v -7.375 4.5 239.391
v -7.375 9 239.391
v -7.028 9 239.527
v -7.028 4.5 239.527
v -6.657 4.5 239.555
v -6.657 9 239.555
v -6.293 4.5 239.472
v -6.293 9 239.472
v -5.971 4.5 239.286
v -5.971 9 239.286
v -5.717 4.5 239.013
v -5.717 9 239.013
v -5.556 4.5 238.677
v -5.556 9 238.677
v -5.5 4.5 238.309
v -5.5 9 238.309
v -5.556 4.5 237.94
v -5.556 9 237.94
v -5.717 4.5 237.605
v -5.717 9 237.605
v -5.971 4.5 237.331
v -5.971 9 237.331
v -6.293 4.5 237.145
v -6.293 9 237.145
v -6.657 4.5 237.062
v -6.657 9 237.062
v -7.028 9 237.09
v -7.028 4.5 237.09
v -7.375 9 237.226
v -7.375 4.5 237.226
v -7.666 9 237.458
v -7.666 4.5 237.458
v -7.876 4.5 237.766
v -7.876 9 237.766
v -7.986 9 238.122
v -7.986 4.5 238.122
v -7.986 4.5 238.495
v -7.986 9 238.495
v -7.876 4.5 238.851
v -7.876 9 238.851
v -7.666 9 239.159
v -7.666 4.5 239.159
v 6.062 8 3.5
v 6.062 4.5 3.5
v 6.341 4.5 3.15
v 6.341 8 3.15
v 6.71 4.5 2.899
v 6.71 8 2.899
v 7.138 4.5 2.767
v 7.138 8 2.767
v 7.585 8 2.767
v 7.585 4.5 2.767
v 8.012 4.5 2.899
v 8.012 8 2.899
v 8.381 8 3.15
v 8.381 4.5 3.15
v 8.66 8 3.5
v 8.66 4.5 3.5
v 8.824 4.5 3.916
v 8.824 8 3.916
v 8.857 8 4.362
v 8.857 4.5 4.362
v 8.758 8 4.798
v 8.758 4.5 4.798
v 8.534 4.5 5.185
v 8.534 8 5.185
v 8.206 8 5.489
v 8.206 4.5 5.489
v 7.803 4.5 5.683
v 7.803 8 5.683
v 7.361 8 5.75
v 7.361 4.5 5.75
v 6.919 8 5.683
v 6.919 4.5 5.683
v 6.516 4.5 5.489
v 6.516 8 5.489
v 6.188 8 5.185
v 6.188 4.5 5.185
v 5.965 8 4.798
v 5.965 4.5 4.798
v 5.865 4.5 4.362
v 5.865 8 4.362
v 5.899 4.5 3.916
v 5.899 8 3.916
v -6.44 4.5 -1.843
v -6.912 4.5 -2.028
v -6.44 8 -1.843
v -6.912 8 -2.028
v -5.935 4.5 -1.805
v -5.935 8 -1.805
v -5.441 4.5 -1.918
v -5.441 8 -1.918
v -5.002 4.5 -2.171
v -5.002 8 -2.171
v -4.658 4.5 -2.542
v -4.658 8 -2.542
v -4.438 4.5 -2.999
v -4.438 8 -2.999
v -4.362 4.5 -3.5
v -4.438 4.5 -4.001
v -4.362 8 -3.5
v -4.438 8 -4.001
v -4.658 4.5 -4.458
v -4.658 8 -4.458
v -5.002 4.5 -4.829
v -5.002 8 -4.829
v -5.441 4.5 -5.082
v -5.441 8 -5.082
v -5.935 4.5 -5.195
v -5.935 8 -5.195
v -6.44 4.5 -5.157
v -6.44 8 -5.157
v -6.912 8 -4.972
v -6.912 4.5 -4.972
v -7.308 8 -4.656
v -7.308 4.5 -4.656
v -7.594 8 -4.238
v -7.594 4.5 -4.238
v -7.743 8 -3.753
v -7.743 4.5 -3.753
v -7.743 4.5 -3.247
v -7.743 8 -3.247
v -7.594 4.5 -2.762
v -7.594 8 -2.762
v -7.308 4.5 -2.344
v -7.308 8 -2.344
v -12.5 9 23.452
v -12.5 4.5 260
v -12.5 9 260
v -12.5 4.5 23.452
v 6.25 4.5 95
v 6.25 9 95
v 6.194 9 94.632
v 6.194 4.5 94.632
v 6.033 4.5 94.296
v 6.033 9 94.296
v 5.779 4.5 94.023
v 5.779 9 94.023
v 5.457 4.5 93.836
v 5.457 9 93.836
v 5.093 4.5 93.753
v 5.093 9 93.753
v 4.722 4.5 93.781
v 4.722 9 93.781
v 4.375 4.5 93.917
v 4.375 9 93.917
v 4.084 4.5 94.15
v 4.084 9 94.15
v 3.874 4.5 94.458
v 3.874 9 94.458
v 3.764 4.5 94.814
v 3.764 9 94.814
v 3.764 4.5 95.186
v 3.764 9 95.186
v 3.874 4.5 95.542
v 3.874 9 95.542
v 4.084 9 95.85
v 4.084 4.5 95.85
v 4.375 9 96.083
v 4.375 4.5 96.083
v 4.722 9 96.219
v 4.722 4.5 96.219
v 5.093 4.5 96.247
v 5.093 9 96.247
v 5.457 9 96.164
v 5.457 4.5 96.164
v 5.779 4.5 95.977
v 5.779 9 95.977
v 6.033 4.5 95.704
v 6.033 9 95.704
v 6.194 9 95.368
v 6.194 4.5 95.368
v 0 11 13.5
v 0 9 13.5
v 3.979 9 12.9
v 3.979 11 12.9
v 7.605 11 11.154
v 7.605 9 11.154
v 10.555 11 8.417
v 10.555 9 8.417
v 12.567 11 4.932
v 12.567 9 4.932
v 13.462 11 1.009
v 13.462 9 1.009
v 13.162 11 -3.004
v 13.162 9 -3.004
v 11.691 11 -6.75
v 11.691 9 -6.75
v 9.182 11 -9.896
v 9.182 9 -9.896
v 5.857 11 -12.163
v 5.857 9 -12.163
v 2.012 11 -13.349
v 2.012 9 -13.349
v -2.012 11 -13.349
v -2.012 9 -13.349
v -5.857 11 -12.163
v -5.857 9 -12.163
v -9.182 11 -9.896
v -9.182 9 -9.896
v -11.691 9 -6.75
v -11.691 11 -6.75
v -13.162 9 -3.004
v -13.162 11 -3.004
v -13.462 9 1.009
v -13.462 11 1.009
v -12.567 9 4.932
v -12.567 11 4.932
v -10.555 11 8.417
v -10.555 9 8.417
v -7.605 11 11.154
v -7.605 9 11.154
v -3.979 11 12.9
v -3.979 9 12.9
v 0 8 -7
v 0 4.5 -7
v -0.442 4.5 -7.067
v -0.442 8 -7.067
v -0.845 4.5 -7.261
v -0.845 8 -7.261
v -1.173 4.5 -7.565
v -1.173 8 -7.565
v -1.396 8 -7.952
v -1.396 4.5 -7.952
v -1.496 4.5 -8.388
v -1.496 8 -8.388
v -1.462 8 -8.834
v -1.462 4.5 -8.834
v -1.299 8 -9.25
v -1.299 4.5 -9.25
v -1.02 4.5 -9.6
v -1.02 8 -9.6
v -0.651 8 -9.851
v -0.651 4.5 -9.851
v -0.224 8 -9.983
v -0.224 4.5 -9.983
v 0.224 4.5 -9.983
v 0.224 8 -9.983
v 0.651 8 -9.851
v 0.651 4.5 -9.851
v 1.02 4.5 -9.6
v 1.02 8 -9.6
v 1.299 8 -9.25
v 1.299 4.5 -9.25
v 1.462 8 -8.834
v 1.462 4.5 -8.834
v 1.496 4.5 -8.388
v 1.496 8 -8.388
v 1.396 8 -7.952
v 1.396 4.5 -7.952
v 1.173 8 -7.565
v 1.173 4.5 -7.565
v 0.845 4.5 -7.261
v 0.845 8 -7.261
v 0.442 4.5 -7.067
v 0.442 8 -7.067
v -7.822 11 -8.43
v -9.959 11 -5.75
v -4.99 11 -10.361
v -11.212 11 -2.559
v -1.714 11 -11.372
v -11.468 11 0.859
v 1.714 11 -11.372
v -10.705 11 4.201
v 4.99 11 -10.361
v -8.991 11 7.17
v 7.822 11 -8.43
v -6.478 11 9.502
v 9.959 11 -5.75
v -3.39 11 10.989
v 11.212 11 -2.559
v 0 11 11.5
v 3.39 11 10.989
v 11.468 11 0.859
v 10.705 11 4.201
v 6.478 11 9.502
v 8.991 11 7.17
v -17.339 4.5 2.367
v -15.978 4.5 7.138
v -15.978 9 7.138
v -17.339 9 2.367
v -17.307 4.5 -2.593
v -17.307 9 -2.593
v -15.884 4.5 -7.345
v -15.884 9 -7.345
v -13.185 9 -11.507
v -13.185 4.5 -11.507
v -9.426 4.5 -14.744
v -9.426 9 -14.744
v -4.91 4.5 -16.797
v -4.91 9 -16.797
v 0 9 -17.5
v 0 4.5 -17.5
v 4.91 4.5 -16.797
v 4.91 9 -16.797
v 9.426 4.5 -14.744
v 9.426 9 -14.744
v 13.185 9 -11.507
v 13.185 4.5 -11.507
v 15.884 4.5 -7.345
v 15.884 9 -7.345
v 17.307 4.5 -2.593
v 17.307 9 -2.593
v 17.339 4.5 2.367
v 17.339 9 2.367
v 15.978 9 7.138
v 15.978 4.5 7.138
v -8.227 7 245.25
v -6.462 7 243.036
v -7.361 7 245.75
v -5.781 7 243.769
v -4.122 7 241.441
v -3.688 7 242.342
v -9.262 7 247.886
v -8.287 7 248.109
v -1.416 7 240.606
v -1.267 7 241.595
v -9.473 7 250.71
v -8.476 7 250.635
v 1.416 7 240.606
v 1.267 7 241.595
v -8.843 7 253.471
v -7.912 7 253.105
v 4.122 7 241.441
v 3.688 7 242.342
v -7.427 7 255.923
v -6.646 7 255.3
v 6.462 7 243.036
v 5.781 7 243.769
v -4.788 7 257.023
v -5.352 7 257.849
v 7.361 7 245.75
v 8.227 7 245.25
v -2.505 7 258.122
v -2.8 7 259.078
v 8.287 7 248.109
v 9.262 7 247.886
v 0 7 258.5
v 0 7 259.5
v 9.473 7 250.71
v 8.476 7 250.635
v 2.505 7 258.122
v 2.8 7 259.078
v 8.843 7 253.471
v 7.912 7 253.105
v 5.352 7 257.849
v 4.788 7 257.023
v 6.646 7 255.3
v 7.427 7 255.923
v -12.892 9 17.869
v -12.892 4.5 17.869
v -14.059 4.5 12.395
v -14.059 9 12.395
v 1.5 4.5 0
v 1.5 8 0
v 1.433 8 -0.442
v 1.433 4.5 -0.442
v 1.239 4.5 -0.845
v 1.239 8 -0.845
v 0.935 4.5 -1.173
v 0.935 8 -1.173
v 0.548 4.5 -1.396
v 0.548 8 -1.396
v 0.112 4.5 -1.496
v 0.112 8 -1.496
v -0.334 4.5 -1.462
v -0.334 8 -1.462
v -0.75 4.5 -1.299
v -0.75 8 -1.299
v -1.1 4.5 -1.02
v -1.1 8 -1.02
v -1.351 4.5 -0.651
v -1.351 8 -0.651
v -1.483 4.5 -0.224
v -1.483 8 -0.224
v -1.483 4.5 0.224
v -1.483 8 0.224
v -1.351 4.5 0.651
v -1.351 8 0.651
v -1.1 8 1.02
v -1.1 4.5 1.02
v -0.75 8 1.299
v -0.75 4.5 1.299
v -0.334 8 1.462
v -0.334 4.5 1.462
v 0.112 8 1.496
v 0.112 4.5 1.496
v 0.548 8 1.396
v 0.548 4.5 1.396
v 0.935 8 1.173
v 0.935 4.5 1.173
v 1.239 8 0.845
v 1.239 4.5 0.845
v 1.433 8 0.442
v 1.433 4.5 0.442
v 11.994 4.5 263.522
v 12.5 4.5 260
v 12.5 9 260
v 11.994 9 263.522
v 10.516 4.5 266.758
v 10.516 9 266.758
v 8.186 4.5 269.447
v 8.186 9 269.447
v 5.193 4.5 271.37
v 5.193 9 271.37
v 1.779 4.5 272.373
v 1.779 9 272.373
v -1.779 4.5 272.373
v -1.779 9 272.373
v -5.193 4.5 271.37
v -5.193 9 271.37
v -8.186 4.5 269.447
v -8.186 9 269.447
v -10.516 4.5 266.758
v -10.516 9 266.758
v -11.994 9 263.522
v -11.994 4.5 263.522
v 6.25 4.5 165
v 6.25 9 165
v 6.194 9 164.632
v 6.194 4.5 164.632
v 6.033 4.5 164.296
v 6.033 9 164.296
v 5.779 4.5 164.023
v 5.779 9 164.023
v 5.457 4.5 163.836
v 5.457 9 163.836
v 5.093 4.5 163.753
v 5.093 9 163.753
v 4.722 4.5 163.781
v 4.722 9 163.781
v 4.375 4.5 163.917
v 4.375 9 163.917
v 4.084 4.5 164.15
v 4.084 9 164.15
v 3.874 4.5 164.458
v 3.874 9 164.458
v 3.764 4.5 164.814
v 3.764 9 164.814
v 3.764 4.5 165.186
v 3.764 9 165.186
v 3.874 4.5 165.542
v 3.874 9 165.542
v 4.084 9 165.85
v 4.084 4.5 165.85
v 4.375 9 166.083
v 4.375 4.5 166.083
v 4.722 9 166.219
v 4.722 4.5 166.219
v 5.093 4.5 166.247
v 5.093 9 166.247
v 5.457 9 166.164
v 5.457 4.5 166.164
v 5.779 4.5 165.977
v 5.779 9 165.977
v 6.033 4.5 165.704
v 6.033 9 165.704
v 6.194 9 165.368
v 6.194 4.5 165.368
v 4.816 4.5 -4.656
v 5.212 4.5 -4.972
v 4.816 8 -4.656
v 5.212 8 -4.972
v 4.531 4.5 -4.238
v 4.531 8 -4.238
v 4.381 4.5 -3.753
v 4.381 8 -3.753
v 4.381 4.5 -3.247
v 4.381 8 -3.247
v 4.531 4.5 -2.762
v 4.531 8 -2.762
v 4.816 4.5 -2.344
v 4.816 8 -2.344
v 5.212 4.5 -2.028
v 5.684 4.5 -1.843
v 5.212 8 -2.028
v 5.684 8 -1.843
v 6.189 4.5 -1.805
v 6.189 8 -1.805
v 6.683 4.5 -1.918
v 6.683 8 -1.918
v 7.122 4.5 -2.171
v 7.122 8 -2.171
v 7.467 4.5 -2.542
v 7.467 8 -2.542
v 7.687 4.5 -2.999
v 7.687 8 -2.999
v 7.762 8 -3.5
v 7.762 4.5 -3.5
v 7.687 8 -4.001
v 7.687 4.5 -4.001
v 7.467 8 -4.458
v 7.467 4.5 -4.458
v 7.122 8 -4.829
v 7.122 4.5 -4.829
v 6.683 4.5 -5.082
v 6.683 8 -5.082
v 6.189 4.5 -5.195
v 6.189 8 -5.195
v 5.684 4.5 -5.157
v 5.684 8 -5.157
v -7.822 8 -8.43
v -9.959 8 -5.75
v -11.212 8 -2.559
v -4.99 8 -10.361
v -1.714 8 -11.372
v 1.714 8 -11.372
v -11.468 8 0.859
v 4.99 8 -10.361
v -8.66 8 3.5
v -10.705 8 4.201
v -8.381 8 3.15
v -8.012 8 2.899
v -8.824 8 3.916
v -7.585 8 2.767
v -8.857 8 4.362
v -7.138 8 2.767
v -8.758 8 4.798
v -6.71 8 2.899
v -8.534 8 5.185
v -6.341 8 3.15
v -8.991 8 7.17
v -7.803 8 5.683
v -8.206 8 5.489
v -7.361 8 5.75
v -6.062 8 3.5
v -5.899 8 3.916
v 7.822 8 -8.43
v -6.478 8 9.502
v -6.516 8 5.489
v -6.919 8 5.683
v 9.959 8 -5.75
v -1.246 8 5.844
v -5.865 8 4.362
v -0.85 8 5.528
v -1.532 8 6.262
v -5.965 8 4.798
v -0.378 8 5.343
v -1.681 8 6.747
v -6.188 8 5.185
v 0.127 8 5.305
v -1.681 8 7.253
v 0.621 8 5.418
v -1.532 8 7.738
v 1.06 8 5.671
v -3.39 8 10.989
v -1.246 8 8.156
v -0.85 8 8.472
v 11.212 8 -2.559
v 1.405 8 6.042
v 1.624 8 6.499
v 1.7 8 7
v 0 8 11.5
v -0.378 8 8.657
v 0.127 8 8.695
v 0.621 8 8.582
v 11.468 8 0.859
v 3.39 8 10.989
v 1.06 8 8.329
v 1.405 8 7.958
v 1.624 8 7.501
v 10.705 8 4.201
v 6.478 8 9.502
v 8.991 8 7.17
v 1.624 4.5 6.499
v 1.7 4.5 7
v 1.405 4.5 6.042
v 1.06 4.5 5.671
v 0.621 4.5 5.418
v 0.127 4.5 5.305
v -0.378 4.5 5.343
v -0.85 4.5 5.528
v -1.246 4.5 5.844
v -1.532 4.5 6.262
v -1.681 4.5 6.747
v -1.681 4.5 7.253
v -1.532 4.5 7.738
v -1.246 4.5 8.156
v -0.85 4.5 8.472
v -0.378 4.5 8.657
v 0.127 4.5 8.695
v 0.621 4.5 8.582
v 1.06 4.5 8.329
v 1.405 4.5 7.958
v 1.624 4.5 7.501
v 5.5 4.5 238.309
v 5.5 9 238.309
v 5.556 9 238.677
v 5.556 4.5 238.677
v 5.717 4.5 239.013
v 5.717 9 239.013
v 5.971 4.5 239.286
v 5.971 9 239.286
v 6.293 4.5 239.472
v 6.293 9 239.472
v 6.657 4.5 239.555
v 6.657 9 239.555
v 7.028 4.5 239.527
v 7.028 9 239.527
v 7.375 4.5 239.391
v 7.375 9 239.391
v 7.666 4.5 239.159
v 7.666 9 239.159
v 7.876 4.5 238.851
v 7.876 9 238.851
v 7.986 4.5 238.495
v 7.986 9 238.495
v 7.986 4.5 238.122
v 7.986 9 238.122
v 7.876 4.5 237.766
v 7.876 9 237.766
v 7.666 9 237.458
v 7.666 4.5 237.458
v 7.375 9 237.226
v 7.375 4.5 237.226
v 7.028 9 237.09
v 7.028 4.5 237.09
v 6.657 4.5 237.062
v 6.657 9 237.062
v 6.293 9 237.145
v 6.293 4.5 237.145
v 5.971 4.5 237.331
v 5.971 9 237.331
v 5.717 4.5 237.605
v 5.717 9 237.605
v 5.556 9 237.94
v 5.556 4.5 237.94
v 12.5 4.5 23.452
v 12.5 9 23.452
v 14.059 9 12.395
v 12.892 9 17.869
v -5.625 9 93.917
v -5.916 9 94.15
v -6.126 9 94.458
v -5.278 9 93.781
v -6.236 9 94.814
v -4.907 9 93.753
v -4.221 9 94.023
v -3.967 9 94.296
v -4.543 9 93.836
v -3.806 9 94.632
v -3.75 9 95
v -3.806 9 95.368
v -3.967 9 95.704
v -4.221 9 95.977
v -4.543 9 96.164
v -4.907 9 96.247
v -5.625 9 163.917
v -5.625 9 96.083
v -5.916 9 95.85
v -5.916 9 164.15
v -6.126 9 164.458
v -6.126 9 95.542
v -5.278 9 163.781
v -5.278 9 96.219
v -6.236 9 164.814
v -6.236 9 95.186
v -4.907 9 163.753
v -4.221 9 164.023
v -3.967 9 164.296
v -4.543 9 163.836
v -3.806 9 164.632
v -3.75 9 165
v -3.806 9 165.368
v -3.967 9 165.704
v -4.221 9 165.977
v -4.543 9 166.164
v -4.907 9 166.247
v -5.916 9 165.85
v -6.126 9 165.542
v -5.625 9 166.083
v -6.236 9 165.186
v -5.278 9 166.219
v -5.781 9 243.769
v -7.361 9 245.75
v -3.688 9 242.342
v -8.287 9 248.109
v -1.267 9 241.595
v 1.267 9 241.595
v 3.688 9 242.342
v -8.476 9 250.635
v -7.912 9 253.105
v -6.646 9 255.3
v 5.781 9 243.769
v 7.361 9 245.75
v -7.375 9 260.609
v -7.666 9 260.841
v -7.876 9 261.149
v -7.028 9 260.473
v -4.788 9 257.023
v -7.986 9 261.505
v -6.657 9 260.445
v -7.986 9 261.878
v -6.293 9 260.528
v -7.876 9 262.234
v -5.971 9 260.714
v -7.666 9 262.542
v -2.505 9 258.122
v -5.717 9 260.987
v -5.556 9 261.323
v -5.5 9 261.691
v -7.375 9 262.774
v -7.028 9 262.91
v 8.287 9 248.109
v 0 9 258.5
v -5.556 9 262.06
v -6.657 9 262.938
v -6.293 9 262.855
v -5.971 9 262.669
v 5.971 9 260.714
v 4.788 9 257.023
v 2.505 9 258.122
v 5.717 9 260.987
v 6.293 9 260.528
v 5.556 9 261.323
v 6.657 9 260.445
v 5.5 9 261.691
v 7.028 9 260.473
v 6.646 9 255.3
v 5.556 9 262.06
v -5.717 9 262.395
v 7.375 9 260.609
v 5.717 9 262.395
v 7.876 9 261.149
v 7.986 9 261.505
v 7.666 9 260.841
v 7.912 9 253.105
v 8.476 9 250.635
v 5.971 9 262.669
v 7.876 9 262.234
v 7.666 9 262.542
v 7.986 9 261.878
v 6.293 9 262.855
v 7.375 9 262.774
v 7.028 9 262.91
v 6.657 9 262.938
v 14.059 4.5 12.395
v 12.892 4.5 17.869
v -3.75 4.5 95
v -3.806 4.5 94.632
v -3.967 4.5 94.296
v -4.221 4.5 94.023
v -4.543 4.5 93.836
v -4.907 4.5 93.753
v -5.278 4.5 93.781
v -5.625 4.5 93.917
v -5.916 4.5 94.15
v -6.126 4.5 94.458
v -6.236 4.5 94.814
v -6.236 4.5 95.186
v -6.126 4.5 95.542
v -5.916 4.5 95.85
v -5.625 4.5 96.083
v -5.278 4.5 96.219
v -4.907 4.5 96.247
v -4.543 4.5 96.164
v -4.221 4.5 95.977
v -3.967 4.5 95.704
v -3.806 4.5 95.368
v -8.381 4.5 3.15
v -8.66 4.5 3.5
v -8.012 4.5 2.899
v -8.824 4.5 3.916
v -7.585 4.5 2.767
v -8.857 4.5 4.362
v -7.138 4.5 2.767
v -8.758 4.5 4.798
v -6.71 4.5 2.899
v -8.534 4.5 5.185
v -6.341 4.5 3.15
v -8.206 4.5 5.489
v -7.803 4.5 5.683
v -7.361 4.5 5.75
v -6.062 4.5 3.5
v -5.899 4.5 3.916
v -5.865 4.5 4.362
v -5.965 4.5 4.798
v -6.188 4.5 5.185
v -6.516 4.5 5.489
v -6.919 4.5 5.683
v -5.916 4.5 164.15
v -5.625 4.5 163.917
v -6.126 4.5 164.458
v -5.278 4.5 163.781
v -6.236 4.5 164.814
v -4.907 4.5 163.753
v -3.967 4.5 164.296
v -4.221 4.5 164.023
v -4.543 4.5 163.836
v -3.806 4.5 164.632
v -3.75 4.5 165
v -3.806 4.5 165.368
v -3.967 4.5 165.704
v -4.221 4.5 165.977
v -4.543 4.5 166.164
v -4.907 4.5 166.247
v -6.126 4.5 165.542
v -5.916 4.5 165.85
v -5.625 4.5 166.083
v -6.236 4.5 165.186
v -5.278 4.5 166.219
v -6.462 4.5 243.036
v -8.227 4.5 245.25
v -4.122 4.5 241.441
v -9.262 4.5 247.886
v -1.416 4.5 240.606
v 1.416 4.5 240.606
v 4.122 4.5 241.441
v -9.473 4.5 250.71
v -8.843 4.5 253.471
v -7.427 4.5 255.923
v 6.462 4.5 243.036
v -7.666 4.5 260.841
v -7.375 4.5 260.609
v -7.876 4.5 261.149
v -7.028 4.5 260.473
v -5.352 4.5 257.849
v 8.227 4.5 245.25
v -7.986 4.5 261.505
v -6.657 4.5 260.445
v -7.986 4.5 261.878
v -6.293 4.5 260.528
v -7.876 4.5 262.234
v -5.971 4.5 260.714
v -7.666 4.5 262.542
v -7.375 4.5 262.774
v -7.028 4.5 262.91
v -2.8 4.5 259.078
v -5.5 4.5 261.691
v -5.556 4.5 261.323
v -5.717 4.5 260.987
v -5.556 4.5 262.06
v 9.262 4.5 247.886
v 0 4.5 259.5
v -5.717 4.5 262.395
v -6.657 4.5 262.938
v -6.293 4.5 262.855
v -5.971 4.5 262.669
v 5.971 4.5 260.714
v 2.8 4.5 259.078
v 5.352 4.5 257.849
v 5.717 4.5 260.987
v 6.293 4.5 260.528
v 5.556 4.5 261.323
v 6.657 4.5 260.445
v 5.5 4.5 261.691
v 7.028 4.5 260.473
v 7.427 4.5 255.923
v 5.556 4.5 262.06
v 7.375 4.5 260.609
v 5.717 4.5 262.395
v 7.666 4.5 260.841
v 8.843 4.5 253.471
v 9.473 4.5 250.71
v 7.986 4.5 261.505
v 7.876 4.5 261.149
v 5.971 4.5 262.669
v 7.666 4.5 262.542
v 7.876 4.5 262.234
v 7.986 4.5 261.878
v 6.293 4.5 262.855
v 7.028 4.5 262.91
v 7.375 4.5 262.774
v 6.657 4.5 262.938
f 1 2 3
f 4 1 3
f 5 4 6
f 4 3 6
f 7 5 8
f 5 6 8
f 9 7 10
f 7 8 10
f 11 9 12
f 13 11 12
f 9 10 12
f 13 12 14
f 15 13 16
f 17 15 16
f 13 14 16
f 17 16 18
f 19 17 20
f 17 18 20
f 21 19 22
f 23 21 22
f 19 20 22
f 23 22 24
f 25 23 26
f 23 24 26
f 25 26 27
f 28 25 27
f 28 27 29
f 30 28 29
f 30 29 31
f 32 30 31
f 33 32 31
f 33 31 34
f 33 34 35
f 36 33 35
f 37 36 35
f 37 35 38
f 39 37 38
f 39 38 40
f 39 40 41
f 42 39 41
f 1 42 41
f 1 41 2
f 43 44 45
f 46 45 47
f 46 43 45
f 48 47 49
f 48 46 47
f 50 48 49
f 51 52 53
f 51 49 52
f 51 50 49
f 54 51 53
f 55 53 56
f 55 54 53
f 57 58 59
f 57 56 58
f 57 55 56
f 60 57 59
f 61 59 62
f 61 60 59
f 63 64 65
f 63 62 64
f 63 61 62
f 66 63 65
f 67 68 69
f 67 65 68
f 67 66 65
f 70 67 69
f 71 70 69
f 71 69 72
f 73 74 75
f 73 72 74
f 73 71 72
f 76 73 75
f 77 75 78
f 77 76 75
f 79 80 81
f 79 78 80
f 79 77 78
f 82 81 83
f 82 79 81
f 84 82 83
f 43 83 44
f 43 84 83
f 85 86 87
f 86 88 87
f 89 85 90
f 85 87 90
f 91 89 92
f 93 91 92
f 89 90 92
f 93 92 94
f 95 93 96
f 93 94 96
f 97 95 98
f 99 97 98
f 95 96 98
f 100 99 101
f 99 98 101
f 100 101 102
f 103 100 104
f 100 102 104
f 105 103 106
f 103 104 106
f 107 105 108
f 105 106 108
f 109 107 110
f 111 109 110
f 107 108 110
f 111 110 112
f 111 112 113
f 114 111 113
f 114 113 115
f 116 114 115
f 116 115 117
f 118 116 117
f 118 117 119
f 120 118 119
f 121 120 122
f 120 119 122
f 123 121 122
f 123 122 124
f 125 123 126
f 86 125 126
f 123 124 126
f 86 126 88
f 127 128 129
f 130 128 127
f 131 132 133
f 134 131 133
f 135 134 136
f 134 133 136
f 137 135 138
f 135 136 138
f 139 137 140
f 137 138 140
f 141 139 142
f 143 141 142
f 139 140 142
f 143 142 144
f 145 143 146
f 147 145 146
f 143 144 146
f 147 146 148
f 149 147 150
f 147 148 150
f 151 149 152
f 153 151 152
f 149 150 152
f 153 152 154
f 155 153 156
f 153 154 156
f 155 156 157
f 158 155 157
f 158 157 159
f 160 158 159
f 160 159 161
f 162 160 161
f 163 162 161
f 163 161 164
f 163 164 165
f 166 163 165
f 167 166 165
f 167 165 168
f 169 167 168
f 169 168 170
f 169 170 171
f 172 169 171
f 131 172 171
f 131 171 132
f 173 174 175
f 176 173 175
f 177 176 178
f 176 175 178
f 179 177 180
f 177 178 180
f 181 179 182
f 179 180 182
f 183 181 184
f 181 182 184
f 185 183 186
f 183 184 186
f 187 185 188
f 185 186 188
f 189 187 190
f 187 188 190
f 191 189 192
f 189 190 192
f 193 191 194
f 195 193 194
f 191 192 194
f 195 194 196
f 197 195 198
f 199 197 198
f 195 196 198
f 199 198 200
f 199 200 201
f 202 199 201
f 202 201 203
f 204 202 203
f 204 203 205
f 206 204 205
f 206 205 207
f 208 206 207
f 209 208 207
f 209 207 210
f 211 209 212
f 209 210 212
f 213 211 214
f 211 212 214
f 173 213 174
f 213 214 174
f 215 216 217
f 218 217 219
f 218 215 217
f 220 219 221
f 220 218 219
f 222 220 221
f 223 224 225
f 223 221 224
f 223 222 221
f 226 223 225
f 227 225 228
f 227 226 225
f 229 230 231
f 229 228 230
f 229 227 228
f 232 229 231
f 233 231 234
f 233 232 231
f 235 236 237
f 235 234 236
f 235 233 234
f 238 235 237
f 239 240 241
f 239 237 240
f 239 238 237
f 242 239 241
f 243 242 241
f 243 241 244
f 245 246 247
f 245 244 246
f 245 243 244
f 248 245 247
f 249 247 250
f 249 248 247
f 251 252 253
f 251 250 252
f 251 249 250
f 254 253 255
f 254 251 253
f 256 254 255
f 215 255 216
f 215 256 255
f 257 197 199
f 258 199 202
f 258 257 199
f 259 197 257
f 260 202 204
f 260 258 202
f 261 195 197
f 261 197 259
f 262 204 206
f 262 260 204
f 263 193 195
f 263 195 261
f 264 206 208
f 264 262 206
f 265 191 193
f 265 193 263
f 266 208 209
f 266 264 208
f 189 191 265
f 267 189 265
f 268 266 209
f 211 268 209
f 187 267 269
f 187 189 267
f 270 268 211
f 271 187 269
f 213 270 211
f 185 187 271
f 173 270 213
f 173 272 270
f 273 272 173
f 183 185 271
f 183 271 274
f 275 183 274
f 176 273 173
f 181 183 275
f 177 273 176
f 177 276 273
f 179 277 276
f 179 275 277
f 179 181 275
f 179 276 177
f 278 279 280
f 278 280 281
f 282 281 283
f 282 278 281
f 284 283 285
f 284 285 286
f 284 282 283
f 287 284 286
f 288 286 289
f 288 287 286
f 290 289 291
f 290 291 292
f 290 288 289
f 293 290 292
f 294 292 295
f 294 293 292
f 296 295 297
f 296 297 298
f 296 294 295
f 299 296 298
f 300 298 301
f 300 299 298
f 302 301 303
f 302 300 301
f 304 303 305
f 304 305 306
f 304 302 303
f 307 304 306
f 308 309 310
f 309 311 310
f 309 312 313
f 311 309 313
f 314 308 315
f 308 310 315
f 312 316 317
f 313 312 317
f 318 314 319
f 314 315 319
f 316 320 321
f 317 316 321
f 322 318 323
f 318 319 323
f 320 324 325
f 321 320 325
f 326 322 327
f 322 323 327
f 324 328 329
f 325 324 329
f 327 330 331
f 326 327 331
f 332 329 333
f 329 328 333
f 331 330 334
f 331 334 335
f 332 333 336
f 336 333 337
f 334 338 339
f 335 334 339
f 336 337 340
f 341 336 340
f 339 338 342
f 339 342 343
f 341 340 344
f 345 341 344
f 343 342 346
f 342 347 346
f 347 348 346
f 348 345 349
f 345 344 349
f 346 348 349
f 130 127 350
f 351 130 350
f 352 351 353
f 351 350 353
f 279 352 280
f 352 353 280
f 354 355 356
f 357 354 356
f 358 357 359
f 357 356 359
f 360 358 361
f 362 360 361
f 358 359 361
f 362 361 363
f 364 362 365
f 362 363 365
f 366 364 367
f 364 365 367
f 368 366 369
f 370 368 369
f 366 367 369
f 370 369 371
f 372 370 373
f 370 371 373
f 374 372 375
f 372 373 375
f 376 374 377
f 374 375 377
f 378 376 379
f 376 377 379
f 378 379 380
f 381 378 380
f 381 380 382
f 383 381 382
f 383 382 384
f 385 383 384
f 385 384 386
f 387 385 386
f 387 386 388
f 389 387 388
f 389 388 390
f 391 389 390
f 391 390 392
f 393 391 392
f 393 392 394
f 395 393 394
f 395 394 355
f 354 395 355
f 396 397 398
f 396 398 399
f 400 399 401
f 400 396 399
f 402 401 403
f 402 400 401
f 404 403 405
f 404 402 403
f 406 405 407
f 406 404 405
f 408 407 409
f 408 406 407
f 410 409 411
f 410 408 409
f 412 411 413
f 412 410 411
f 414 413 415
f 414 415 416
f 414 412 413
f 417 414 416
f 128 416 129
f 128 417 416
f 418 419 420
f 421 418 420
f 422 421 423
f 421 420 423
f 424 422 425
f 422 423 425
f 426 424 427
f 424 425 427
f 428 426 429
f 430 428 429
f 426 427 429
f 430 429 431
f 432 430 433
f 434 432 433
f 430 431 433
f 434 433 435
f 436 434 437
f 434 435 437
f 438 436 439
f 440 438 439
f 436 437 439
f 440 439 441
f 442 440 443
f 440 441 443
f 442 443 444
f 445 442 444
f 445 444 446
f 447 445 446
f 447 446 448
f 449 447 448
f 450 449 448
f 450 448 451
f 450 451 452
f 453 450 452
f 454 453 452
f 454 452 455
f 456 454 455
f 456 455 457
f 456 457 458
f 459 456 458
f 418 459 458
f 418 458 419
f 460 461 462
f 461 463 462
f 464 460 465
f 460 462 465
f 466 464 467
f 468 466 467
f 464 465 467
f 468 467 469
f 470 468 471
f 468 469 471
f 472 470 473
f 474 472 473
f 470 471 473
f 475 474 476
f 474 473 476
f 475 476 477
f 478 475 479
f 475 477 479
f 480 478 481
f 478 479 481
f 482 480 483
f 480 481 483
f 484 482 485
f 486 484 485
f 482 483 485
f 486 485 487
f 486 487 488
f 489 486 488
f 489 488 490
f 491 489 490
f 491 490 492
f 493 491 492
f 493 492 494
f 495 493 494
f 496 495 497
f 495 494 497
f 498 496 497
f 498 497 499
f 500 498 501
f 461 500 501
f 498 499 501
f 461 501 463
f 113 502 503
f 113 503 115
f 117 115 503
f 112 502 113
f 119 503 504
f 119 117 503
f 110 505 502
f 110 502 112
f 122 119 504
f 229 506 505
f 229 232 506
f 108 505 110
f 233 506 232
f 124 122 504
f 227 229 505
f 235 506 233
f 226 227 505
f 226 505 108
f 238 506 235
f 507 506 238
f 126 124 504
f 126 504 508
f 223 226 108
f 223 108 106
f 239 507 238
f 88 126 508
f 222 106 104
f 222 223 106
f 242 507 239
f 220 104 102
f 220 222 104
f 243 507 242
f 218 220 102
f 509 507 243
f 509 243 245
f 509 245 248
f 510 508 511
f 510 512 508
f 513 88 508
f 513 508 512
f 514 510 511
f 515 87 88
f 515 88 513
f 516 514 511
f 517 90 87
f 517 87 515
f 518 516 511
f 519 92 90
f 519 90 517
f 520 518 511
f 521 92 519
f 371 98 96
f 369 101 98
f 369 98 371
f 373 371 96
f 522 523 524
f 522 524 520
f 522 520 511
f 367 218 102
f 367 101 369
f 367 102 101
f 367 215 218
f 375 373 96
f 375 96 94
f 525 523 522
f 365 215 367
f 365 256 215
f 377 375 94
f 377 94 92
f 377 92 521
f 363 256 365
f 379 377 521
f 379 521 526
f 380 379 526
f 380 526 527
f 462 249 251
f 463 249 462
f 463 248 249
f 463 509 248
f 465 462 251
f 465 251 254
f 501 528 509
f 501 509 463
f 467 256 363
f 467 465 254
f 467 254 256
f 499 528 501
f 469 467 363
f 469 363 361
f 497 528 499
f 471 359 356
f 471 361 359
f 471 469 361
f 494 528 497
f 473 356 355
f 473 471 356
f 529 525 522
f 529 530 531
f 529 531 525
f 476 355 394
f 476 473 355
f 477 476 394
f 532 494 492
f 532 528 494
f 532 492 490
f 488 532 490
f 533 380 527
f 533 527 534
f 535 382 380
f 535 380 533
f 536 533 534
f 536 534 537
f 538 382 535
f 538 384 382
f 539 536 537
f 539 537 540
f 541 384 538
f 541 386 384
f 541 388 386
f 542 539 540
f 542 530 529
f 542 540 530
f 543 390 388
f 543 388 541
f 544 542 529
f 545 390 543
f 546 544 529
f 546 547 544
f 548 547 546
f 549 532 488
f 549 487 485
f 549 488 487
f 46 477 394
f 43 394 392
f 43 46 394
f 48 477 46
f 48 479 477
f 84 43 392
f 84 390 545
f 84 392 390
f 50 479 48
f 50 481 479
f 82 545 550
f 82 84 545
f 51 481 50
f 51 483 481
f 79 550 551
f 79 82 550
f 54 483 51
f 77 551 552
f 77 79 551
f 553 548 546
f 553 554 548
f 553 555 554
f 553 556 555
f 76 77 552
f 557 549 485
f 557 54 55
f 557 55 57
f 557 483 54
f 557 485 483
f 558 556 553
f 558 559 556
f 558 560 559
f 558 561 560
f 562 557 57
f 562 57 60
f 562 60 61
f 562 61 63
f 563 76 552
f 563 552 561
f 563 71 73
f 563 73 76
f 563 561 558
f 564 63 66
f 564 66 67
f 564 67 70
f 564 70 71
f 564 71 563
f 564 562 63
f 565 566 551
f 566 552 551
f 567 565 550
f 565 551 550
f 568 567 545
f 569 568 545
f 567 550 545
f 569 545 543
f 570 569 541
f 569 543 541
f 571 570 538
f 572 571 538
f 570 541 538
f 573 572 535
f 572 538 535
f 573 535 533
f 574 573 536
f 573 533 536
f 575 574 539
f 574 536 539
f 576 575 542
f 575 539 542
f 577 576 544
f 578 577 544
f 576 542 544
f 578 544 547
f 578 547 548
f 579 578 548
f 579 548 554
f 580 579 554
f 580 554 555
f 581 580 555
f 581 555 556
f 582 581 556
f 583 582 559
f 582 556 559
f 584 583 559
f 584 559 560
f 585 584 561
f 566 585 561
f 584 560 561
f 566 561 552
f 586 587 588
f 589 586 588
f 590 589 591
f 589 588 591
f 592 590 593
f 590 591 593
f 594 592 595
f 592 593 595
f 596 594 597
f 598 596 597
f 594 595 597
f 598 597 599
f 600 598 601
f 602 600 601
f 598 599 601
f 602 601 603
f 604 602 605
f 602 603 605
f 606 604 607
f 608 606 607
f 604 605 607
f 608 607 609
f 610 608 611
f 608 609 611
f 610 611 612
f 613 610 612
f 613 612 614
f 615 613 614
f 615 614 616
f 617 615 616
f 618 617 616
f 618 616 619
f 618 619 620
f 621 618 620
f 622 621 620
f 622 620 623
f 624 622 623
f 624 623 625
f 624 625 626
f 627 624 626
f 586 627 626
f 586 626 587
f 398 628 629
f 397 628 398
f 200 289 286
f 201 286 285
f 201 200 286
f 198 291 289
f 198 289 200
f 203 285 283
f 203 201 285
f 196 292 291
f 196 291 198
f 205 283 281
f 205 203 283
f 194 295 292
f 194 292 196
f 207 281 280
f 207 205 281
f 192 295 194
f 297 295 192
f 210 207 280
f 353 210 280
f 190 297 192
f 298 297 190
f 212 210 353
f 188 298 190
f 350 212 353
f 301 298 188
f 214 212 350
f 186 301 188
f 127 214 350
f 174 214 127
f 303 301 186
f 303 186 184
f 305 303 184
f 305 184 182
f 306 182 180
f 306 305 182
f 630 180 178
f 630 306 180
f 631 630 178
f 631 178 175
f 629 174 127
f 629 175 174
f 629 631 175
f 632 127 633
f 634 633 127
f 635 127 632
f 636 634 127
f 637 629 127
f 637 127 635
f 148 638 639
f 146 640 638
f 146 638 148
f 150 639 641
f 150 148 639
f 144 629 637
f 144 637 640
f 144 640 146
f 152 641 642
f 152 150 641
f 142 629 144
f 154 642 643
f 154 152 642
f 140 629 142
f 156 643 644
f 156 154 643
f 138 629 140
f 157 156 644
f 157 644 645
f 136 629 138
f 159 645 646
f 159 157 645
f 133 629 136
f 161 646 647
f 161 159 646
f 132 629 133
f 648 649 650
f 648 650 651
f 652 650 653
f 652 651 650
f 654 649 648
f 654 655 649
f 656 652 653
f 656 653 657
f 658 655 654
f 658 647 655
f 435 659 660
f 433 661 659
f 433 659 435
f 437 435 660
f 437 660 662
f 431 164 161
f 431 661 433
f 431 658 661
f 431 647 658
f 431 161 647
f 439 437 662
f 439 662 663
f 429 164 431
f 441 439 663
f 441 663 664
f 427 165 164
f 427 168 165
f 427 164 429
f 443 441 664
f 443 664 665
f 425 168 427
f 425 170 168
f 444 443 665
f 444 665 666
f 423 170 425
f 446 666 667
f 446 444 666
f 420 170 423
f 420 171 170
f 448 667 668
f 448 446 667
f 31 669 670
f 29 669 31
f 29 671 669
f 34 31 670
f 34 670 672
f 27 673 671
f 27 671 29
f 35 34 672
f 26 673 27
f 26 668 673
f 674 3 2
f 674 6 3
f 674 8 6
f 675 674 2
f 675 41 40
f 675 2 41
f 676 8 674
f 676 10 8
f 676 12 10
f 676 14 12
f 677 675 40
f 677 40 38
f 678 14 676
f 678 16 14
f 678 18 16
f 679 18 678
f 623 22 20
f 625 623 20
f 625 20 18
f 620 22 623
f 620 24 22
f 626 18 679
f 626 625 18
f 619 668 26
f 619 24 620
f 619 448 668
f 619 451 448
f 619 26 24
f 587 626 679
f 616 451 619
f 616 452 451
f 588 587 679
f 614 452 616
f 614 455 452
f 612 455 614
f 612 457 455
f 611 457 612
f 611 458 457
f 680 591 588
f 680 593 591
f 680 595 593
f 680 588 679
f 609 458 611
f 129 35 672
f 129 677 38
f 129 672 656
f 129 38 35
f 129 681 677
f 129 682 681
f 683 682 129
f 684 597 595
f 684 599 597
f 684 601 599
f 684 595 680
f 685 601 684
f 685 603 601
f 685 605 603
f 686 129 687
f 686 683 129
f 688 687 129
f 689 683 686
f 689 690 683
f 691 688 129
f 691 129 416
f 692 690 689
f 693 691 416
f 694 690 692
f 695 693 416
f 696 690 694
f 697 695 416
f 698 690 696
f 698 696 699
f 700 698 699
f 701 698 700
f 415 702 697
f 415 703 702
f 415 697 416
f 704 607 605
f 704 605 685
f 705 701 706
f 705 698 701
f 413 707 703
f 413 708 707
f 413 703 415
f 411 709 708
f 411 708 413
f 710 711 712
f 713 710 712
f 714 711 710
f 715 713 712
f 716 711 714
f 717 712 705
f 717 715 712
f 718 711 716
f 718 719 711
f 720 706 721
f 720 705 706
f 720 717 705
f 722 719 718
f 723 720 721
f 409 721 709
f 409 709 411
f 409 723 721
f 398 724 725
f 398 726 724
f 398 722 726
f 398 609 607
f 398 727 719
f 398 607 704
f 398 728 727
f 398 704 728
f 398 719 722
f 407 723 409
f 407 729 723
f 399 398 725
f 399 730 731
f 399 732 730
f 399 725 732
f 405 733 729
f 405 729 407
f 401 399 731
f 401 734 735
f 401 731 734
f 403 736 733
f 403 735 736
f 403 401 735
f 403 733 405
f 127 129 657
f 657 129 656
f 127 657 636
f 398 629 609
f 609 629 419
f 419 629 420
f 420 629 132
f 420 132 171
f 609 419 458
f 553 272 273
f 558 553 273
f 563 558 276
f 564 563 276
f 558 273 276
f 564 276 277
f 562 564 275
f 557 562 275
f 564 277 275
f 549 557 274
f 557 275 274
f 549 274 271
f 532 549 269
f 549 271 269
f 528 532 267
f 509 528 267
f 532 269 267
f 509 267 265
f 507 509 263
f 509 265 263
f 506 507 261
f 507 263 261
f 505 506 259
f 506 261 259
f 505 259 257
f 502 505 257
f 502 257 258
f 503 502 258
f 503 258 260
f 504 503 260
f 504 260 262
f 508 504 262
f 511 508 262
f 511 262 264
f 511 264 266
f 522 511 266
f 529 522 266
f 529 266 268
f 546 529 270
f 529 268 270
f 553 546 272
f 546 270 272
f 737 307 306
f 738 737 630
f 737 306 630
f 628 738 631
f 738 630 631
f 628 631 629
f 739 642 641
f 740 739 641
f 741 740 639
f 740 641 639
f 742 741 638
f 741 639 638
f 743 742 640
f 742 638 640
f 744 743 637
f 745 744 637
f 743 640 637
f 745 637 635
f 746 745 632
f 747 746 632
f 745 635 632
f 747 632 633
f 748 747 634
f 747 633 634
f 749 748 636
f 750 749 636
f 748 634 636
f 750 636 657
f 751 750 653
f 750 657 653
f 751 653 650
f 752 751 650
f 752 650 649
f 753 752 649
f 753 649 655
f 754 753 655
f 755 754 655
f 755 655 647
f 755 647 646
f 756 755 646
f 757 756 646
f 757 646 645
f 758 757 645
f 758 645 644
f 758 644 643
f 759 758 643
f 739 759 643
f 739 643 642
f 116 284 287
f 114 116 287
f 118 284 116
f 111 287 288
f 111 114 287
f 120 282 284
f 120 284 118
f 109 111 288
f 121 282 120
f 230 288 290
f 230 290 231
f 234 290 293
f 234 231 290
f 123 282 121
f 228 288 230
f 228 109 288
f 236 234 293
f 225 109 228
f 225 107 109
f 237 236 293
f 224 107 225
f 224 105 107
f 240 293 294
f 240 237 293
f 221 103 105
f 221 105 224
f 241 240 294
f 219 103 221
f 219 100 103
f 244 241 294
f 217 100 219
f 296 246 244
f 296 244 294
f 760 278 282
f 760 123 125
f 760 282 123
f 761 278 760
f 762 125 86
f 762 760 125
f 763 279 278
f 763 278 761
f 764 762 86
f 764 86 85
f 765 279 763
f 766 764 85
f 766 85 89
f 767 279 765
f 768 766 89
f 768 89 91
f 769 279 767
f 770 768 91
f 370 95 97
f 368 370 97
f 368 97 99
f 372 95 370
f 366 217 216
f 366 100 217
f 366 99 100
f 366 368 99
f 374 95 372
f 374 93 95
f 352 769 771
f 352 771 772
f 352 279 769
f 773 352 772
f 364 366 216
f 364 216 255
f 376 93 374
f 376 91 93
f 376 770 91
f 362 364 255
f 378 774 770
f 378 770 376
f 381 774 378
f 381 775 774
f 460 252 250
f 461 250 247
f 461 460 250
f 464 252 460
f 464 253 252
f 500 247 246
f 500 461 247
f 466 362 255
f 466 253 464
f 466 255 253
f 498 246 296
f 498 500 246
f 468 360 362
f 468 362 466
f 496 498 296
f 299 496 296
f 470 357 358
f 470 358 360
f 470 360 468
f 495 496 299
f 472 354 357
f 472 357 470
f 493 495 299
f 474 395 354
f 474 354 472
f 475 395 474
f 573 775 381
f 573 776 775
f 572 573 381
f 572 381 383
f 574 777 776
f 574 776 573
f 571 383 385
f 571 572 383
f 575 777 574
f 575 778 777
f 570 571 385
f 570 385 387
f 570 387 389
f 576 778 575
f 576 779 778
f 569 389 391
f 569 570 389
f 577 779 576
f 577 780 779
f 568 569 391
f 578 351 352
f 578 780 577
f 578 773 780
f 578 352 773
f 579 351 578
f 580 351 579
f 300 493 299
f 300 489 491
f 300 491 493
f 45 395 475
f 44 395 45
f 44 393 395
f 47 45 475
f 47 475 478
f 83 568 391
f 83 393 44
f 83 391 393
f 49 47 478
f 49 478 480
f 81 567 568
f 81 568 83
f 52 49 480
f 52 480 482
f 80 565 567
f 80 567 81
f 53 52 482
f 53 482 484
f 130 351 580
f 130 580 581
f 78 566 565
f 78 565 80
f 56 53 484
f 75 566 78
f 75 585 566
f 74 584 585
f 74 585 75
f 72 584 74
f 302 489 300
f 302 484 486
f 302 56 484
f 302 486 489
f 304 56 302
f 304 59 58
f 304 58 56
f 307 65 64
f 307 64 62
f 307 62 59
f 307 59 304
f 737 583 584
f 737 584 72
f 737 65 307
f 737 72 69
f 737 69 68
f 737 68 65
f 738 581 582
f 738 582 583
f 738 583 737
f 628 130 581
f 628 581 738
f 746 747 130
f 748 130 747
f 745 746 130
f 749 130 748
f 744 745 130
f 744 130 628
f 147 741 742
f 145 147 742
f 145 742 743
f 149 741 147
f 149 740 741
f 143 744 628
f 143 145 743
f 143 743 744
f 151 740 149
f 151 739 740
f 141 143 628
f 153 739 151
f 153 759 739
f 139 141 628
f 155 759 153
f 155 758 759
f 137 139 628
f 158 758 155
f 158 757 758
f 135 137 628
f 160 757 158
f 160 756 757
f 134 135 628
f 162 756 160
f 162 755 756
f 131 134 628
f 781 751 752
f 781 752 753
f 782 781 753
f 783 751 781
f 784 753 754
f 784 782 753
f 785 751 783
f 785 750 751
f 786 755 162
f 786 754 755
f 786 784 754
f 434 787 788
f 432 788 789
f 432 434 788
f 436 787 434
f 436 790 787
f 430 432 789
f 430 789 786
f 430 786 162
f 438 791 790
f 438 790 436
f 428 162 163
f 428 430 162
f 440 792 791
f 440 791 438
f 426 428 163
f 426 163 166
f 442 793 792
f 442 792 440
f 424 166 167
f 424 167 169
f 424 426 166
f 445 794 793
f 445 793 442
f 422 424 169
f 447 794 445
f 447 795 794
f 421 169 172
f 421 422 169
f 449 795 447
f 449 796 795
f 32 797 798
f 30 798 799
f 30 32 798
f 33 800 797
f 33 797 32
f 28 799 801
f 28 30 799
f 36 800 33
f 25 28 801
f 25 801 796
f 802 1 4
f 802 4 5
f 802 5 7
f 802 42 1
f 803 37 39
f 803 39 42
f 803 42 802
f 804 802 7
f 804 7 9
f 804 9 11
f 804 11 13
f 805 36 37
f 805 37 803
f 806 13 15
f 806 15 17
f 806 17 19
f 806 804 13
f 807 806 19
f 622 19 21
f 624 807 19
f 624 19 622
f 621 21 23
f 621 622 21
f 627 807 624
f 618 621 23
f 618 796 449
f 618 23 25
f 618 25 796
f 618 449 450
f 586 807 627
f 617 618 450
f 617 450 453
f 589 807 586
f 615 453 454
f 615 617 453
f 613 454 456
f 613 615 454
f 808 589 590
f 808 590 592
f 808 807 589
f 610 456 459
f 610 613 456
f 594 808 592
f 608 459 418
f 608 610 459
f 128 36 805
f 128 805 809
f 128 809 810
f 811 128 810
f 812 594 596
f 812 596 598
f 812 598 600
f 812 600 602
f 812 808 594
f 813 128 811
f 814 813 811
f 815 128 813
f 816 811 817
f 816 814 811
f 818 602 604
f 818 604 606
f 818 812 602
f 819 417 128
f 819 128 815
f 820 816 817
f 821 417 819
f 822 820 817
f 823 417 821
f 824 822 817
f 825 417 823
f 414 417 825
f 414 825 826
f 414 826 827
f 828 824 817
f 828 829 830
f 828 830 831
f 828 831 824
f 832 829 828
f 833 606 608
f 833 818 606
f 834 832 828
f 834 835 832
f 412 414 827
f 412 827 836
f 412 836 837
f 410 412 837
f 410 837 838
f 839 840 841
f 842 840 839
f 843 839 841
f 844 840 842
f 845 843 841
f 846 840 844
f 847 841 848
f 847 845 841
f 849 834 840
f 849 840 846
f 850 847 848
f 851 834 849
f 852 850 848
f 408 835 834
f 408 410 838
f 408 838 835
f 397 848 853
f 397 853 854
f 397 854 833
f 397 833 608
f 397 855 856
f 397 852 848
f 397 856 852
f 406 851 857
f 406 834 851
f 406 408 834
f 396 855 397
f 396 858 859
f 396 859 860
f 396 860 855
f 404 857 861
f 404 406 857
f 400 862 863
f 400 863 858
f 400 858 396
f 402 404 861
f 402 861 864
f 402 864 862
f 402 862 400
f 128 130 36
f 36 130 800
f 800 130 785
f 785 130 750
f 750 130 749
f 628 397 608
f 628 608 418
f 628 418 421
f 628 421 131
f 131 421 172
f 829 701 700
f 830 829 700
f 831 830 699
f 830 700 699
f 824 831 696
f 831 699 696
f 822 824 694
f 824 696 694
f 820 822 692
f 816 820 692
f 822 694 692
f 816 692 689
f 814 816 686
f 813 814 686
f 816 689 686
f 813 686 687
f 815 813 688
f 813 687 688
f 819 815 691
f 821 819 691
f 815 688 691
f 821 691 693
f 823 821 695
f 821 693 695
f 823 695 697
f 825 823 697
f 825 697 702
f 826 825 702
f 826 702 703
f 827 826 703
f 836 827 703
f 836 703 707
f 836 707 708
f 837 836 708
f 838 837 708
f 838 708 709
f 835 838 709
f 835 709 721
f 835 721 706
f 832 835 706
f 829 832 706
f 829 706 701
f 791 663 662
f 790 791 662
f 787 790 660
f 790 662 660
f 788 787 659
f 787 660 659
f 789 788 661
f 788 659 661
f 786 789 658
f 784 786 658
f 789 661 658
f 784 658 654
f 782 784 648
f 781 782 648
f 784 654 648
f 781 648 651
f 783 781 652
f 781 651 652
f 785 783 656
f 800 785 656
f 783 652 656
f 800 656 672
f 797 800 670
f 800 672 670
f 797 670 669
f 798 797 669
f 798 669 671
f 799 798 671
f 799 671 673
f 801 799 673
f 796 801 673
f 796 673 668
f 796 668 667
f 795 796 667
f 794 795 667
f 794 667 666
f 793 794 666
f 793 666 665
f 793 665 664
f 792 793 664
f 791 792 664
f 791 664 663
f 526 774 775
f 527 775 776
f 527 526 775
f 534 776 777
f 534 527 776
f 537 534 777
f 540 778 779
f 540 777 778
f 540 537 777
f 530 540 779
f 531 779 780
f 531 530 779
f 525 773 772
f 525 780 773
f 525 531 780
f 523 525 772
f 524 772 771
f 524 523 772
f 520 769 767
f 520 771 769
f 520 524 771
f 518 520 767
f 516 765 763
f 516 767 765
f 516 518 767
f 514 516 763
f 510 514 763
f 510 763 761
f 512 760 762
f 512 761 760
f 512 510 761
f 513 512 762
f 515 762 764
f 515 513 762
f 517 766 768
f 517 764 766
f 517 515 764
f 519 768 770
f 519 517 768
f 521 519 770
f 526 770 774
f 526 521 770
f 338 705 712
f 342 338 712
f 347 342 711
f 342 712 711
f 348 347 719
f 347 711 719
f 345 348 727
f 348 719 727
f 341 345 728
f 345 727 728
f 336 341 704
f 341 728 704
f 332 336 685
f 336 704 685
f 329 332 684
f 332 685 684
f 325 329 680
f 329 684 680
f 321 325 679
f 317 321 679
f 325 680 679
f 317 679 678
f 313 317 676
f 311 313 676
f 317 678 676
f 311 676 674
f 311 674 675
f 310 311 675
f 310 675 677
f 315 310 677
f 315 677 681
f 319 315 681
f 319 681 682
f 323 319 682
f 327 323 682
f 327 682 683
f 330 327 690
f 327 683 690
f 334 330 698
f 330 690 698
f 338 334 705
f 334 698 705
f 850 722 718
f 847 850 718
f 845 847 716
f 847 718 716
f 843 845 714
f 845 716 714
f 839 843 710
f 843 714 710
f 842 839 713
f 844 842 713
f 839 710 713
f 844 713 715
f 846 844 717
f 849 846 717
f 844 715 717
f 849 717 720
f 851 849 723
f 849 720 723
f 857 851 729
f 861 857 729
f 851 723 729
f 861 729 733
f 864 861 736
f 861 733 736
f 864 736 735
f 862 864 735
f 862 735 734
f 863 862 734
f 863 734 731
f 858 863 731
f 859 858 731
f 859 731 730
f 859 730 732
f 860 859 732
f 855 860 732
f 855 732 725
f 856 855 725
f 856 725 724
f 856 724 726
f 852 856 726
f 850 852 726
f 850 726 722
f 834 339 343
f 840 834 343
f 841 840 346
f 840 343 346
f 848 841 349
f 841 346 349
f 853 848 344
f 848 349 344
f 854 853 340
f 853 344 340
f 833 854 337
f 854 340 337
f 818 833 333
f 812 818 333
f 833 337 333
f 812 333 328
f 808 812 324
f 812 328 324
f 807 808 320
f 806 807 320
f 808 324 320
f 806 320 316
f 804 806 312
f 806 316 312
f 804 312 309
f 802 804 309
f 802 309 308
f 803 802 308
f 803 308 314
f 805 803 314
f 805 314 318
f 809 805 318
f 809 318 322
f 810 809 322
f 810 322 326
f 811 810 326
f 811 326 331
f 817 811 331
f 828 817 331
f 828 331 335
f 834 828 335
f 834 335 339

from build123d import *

# Parameters (mm, degrees)
EXTRUDE_1_DEPTH              = 9
SKETCH_3_R                   = 13.5
EXTRUDE_2_DEPTH              = 2
EXTRUDE_START                = 3
SKETCH_4_R                   = 13.5
EXTRUDE_3_DEPTH              = 3
SKETCH_5_R                   = 9.5
CUT_EXTRUDE_2_DEPTH          = 274.324898244
HOLE_WIZARD_M3_1_D           = 3.4
HOLE_WIZARD_M3_1_CBORE_D     = 6.5
HOLE_WIZARD_M3_1_CBORE_DEPTH = 3.4
PATTERN_CIRCULAR_1_COUNT     = 3
EXTRUDE_START_2              = 7
SKETCH_11_R                  = 12.5
SKETCH_11_R_2                = 3.25
EXTRUDE_4_DEPTH              = 7
SKETCH_13_R                  = 11.5
CUT_EXTRUDE_3_DEPTH          = 3
FILLET_1_R                   = 40
SKETCH_26_W                  = 65.136073631
SKETCH_26_H                  = 24.89875822
CUT_EXTRUDE_5_DEPTH          = 1111
SKETCH_28_R                  = 9.5
SKETCH_28_R_2                = 8.5
EXTRUDE_5_DEPTH              = 2
HOLE_WIZARD_M3_2_D           = 2.5
PATTERN_LINEAR_1_COUNT       = 3
PATTERN_LINEAR_1_PITCH       = 70
PATTERN_LINEAR_1_COUNT_DIR2  = 2
PATTERN_LINEAR_1_PITCH_DIR2  = 10
HOLE_WIZARD_M3_3_D           = 2.5
PATTERN_CIRCULAR_4_COUNT     = 6
EXTRUDE_START_3              = -4.5
SKETCH_44_R                  = 1.25
EXTRUDE_6_DEPTH              = 4.5
F_3_0MM_2_D                  = 3
F_3_0MM_2_DEPTH              = 5
F_3_0MM_2_TIP                = 0.901290929
PATTERN_CIRCULAR_5_COUNT     = 3


with BuildPart() as part:
    # 스케치1 → 보스-돌출1 (new body)
    with BuildSketch(Plane(origin=(0, 0, 0), x_dir=(1, 0, 0), z_dir=(0, 1, 0))):
        with BuildLine():
            Line((-12.5, -260), (-12.5, -12.247448714))
            ThreePointArc((-12.5, -12.247448714), (0, 17.5), (12.5, -12.247448714))
            Line((12.5, -12.247448714), (12.5, -260))
            ThreePointArc((12.5, -260), (0, -272.5), (-12.5, -260))
        make_face()
    extrude(amount=EXTRUDE_1_DEPTH)

    # 스케치3 → 보스-돌출2 (add)
    with BuildSketch(Plane(origin=(0, 9, 0), x_dir=(1, 0, 0), z_dir=(0, 1, 0))):
        Circle(SKETCH_3_R)
    extrude(amount=EXTRUDE_2_DEPTH)

    # 스케치4 → 보스-돌출3 (add)
    with BuildSketch(Plane.XZ.offset(EXTRUDE_START)):
        Circle(SKETCH_4_R)
    extrude(amount=-EXTRUDE_3_DEPTH)

    # 스케치5 → 컷-돌출2 (cut, through all)
    with BuildSketch(Plane(origin=(0, 9, 0), x_dir=(1, 0, 0), z_dir=(0, 1, 0))):
        with Locations((0, -250)):
            Circle(SKETCH_5_R)
    extrude(amount=-CUT_EXTRUDE_2_DEPTH, mode=Mode.SUBTRACT)

    # M3 육각 소켓 머리 캡 나사용 카운터보어1 (through all)
    with Locations(Plane(origin=(0, -3, 0), x_dir=(-1, 0, 0), z_dir=(0, -1, 0))):
        with Locations((0, -7)):
            hole_wizard_m3_1 = CounterBoreHole(HOLE_WIZARD_M3_1_D / 2, HOLE_WIZARD_M3_1_CBORE_D / 2, HOLE_WIZARD_M3_1_CBORE_DEPTH)

    # 원형 패턴1: M3 육각 소켓 머리 캡 나사용 카운터보어1 ×3 about axis
    pattern_circular_1_axis = Axis((0, 9, 0), (0, -1, 0))
    for i in range(1, PATTERN_CIRCULAR_1_COUNT):
        add(hole_wizard_m3_1.rotate(pattern_circular_1_axis, i * 360 / PATTERN_CIRCULAR_1_COUNT), mode=Mode.SUBTRACT)

    # 스케치11 → 보스-돌출4 (add)
    with BuildSketch(Plane.XZ.offset(3).offset(EXTRUDE_START_2)):
        Circle(SKETCH_11_R)
        with Locations((-6.062177826, -3.5)):
            Circle(SKETCH_11_R_2, mode=Mode.SUBTRACT)
        with Locations((6.062177826, -3.5)):
            Circle(SKETCH_11_R_2, mode=Mode.SUBTRACT)
        with Locations((0, 7)):
            Circle(SKETCH_11_R_2, mode=Mode.SUBTRACT)
    extrude(amount=-EXTRUDE_4_DEPTH)

    # 스케치13 → 컷-돌출3 (cut)
    with BuildSketch(Plane(origin=(0, 11, 0), x_dir=(1, 0, 0), z_dir=(0, 1, 0))):
        Circle(SKETCH_13_R)
    extrude(amount=-CUT_EXTRUDE_3_DEPTH, mode=Mode.SUBTRACT)

    # 필렛1
    fillet_1_edges = [part.edges().sort_by_distance(p)[0] for p in [
        (12.5, 4.5, 12.247448714),
        (-12.5, 4.5, 12.247448714),
    ]]
    fillet(fillet_1_edges, radius=FILLET_1_R)

    # 스케치26 → 컷-돌출5 (cut, symmetric)
    with BuildSketch(Plane.XY):
        with Locations((0.11753139, -7.94937911)):
            Rectangle(SKETCH_26_W, SKETCH_26_H)
    extrude(amount=CUT_EXTRUDE_5_DEPTH, both=True, mode=Mode.SUBTRACT)

    # 스케치28 → 보스-돌출5 (add)
    with BuildSketch(Plane(origin=(0, 9, 0), x_dir=(1, 0, 0), z_dir=(0, 1, 0))):
        with Locations((0, -250)):
            Circle(SKETCH_28_R)
        with Locations((0, -250)):
            Circle(SKETCH_28_R_2, mode=Mode.SUBTRACT)
    extrude(amount=-EXTRUDE_5_DEPTH)

    # M3 탭을 위한 탭 드릴2 (through all)
    with Locations(Plane(origin=(0, 4.5, 0), x_dir=(-1, 0, 0), z_dir=(0, -1, 0))):
        with Locations((5, -25)):
            hole_wizard_m3_2 = Hole(HOLE_WIZARD_M3_2_D / 2)

    # 선형 패턴1: Hole Wizard M3 _ _ _ _2 3 × 2
    with Locations(*[(j * PATTERN_LINEAR_1_PITCH_DIR2, 0, i * PATTERN_LINEAR_1_PITCH) for i in range(PATTERN_LINEAR_1_COUNT) for j in range(PATTERN_LINEAR_1_COUNT_DIR2) if (i, j) != (0, 0)]):
        add(hole_wizard_m3_2, mode=Mode.SUBTRACT)

    # M3 탭을 위한 탭 드릴3 (through all)
    with Locations(Plane(origin=(0, 4.5, 0), x_dir=(-1, 0, 0), z_dir=(0, -1, 0))):
        with Locations((6.75, -261.691342951)):
            hole_wizard_m3_3 = Hole(HOLE_WIZARD_M3_3_D / 2)

    # 원형 패턴4: M3 탭을 위한 탭 드릴3 ×6 about axis, 2 skipped
    pattern_circular_4_axis = Axis((0, -3, 250), (0, 1, 0))
    add([hole_wizard_m3_3.rotate(pattern_circular_4_axis, i * 360 / PATTERN_CIRCULAR_4_COUNT) for i in range(1, PATTERN_CIRCULAR_4_COUNT) if i not in (2, 5)], mode=Mode.SUBTRACT)

    # 스케치44 → 보스-돌출6 (add)
    with BuildSketch(Plane.XZ.offset(-4.5).offset(EXTRUDE_START_3)):
        with Locations((5, 25)):
            Circle(SKETCH_44_R)
        with Locations((-5, 25)):
            Circle(SKETCH_44_R)
    extrude(amount=EXTRUDE_6_DEPTH)

    # Ø3.0mm 맞춤핀 구멍2
    with Locations(Plane(origin=(0, 4.5, 0), x_dir=(-1, 0, 0), z_dir=(0, -1, 0))):
        with Locations((0, 0)):
            Hole(F_3_0MM_2_D / 2, depth=F_3_0MM_2_DEPTH)
            with Locations((0, 0, -(F_3_0MM_2_DEPTH + F_3_0MM_2_TIP / 2))):  # 118° drill point
                Cone(0, F_3_0MM_2_D / 2, F_3_0MM_2_TIP, mode=Mode.SUBTRACT)

    # 스케치50 → Ø3.0mm 맞춤핀 구멍3 (revolve, cut)
    with BuildSketch(Plane(origin=(0, 8, -8.5), x_dir=(0, 0, 1), z_dir=(1, 0, 0))):
        Polygon((0, 0), (0, 5.901290929), (1.5, 5), (1.5, 0), align=None)
    f_3_0mm_3 = revolve(axis=Axis((0, 14.35, -8.5), (0, -1, 0)), mode=Mode.SUBTRACT)

    # 원형 패턴5: Ø3.0mm 맞춤핀 구멍3 ×3 about axis
    pattern_circular_5_axis = Axis((0, 11, 0), (0, -1, 0))
    for i in range(1, PATTERN_CIRCULAR_5_COUNT):
        add(f_3_0mm_3.rotate(pattern_circular_5_axis, i * 360 / PATTERN_CIRCULAR_5_COUNT), mode=Mode.SUBTRACT)


solid = part.part
